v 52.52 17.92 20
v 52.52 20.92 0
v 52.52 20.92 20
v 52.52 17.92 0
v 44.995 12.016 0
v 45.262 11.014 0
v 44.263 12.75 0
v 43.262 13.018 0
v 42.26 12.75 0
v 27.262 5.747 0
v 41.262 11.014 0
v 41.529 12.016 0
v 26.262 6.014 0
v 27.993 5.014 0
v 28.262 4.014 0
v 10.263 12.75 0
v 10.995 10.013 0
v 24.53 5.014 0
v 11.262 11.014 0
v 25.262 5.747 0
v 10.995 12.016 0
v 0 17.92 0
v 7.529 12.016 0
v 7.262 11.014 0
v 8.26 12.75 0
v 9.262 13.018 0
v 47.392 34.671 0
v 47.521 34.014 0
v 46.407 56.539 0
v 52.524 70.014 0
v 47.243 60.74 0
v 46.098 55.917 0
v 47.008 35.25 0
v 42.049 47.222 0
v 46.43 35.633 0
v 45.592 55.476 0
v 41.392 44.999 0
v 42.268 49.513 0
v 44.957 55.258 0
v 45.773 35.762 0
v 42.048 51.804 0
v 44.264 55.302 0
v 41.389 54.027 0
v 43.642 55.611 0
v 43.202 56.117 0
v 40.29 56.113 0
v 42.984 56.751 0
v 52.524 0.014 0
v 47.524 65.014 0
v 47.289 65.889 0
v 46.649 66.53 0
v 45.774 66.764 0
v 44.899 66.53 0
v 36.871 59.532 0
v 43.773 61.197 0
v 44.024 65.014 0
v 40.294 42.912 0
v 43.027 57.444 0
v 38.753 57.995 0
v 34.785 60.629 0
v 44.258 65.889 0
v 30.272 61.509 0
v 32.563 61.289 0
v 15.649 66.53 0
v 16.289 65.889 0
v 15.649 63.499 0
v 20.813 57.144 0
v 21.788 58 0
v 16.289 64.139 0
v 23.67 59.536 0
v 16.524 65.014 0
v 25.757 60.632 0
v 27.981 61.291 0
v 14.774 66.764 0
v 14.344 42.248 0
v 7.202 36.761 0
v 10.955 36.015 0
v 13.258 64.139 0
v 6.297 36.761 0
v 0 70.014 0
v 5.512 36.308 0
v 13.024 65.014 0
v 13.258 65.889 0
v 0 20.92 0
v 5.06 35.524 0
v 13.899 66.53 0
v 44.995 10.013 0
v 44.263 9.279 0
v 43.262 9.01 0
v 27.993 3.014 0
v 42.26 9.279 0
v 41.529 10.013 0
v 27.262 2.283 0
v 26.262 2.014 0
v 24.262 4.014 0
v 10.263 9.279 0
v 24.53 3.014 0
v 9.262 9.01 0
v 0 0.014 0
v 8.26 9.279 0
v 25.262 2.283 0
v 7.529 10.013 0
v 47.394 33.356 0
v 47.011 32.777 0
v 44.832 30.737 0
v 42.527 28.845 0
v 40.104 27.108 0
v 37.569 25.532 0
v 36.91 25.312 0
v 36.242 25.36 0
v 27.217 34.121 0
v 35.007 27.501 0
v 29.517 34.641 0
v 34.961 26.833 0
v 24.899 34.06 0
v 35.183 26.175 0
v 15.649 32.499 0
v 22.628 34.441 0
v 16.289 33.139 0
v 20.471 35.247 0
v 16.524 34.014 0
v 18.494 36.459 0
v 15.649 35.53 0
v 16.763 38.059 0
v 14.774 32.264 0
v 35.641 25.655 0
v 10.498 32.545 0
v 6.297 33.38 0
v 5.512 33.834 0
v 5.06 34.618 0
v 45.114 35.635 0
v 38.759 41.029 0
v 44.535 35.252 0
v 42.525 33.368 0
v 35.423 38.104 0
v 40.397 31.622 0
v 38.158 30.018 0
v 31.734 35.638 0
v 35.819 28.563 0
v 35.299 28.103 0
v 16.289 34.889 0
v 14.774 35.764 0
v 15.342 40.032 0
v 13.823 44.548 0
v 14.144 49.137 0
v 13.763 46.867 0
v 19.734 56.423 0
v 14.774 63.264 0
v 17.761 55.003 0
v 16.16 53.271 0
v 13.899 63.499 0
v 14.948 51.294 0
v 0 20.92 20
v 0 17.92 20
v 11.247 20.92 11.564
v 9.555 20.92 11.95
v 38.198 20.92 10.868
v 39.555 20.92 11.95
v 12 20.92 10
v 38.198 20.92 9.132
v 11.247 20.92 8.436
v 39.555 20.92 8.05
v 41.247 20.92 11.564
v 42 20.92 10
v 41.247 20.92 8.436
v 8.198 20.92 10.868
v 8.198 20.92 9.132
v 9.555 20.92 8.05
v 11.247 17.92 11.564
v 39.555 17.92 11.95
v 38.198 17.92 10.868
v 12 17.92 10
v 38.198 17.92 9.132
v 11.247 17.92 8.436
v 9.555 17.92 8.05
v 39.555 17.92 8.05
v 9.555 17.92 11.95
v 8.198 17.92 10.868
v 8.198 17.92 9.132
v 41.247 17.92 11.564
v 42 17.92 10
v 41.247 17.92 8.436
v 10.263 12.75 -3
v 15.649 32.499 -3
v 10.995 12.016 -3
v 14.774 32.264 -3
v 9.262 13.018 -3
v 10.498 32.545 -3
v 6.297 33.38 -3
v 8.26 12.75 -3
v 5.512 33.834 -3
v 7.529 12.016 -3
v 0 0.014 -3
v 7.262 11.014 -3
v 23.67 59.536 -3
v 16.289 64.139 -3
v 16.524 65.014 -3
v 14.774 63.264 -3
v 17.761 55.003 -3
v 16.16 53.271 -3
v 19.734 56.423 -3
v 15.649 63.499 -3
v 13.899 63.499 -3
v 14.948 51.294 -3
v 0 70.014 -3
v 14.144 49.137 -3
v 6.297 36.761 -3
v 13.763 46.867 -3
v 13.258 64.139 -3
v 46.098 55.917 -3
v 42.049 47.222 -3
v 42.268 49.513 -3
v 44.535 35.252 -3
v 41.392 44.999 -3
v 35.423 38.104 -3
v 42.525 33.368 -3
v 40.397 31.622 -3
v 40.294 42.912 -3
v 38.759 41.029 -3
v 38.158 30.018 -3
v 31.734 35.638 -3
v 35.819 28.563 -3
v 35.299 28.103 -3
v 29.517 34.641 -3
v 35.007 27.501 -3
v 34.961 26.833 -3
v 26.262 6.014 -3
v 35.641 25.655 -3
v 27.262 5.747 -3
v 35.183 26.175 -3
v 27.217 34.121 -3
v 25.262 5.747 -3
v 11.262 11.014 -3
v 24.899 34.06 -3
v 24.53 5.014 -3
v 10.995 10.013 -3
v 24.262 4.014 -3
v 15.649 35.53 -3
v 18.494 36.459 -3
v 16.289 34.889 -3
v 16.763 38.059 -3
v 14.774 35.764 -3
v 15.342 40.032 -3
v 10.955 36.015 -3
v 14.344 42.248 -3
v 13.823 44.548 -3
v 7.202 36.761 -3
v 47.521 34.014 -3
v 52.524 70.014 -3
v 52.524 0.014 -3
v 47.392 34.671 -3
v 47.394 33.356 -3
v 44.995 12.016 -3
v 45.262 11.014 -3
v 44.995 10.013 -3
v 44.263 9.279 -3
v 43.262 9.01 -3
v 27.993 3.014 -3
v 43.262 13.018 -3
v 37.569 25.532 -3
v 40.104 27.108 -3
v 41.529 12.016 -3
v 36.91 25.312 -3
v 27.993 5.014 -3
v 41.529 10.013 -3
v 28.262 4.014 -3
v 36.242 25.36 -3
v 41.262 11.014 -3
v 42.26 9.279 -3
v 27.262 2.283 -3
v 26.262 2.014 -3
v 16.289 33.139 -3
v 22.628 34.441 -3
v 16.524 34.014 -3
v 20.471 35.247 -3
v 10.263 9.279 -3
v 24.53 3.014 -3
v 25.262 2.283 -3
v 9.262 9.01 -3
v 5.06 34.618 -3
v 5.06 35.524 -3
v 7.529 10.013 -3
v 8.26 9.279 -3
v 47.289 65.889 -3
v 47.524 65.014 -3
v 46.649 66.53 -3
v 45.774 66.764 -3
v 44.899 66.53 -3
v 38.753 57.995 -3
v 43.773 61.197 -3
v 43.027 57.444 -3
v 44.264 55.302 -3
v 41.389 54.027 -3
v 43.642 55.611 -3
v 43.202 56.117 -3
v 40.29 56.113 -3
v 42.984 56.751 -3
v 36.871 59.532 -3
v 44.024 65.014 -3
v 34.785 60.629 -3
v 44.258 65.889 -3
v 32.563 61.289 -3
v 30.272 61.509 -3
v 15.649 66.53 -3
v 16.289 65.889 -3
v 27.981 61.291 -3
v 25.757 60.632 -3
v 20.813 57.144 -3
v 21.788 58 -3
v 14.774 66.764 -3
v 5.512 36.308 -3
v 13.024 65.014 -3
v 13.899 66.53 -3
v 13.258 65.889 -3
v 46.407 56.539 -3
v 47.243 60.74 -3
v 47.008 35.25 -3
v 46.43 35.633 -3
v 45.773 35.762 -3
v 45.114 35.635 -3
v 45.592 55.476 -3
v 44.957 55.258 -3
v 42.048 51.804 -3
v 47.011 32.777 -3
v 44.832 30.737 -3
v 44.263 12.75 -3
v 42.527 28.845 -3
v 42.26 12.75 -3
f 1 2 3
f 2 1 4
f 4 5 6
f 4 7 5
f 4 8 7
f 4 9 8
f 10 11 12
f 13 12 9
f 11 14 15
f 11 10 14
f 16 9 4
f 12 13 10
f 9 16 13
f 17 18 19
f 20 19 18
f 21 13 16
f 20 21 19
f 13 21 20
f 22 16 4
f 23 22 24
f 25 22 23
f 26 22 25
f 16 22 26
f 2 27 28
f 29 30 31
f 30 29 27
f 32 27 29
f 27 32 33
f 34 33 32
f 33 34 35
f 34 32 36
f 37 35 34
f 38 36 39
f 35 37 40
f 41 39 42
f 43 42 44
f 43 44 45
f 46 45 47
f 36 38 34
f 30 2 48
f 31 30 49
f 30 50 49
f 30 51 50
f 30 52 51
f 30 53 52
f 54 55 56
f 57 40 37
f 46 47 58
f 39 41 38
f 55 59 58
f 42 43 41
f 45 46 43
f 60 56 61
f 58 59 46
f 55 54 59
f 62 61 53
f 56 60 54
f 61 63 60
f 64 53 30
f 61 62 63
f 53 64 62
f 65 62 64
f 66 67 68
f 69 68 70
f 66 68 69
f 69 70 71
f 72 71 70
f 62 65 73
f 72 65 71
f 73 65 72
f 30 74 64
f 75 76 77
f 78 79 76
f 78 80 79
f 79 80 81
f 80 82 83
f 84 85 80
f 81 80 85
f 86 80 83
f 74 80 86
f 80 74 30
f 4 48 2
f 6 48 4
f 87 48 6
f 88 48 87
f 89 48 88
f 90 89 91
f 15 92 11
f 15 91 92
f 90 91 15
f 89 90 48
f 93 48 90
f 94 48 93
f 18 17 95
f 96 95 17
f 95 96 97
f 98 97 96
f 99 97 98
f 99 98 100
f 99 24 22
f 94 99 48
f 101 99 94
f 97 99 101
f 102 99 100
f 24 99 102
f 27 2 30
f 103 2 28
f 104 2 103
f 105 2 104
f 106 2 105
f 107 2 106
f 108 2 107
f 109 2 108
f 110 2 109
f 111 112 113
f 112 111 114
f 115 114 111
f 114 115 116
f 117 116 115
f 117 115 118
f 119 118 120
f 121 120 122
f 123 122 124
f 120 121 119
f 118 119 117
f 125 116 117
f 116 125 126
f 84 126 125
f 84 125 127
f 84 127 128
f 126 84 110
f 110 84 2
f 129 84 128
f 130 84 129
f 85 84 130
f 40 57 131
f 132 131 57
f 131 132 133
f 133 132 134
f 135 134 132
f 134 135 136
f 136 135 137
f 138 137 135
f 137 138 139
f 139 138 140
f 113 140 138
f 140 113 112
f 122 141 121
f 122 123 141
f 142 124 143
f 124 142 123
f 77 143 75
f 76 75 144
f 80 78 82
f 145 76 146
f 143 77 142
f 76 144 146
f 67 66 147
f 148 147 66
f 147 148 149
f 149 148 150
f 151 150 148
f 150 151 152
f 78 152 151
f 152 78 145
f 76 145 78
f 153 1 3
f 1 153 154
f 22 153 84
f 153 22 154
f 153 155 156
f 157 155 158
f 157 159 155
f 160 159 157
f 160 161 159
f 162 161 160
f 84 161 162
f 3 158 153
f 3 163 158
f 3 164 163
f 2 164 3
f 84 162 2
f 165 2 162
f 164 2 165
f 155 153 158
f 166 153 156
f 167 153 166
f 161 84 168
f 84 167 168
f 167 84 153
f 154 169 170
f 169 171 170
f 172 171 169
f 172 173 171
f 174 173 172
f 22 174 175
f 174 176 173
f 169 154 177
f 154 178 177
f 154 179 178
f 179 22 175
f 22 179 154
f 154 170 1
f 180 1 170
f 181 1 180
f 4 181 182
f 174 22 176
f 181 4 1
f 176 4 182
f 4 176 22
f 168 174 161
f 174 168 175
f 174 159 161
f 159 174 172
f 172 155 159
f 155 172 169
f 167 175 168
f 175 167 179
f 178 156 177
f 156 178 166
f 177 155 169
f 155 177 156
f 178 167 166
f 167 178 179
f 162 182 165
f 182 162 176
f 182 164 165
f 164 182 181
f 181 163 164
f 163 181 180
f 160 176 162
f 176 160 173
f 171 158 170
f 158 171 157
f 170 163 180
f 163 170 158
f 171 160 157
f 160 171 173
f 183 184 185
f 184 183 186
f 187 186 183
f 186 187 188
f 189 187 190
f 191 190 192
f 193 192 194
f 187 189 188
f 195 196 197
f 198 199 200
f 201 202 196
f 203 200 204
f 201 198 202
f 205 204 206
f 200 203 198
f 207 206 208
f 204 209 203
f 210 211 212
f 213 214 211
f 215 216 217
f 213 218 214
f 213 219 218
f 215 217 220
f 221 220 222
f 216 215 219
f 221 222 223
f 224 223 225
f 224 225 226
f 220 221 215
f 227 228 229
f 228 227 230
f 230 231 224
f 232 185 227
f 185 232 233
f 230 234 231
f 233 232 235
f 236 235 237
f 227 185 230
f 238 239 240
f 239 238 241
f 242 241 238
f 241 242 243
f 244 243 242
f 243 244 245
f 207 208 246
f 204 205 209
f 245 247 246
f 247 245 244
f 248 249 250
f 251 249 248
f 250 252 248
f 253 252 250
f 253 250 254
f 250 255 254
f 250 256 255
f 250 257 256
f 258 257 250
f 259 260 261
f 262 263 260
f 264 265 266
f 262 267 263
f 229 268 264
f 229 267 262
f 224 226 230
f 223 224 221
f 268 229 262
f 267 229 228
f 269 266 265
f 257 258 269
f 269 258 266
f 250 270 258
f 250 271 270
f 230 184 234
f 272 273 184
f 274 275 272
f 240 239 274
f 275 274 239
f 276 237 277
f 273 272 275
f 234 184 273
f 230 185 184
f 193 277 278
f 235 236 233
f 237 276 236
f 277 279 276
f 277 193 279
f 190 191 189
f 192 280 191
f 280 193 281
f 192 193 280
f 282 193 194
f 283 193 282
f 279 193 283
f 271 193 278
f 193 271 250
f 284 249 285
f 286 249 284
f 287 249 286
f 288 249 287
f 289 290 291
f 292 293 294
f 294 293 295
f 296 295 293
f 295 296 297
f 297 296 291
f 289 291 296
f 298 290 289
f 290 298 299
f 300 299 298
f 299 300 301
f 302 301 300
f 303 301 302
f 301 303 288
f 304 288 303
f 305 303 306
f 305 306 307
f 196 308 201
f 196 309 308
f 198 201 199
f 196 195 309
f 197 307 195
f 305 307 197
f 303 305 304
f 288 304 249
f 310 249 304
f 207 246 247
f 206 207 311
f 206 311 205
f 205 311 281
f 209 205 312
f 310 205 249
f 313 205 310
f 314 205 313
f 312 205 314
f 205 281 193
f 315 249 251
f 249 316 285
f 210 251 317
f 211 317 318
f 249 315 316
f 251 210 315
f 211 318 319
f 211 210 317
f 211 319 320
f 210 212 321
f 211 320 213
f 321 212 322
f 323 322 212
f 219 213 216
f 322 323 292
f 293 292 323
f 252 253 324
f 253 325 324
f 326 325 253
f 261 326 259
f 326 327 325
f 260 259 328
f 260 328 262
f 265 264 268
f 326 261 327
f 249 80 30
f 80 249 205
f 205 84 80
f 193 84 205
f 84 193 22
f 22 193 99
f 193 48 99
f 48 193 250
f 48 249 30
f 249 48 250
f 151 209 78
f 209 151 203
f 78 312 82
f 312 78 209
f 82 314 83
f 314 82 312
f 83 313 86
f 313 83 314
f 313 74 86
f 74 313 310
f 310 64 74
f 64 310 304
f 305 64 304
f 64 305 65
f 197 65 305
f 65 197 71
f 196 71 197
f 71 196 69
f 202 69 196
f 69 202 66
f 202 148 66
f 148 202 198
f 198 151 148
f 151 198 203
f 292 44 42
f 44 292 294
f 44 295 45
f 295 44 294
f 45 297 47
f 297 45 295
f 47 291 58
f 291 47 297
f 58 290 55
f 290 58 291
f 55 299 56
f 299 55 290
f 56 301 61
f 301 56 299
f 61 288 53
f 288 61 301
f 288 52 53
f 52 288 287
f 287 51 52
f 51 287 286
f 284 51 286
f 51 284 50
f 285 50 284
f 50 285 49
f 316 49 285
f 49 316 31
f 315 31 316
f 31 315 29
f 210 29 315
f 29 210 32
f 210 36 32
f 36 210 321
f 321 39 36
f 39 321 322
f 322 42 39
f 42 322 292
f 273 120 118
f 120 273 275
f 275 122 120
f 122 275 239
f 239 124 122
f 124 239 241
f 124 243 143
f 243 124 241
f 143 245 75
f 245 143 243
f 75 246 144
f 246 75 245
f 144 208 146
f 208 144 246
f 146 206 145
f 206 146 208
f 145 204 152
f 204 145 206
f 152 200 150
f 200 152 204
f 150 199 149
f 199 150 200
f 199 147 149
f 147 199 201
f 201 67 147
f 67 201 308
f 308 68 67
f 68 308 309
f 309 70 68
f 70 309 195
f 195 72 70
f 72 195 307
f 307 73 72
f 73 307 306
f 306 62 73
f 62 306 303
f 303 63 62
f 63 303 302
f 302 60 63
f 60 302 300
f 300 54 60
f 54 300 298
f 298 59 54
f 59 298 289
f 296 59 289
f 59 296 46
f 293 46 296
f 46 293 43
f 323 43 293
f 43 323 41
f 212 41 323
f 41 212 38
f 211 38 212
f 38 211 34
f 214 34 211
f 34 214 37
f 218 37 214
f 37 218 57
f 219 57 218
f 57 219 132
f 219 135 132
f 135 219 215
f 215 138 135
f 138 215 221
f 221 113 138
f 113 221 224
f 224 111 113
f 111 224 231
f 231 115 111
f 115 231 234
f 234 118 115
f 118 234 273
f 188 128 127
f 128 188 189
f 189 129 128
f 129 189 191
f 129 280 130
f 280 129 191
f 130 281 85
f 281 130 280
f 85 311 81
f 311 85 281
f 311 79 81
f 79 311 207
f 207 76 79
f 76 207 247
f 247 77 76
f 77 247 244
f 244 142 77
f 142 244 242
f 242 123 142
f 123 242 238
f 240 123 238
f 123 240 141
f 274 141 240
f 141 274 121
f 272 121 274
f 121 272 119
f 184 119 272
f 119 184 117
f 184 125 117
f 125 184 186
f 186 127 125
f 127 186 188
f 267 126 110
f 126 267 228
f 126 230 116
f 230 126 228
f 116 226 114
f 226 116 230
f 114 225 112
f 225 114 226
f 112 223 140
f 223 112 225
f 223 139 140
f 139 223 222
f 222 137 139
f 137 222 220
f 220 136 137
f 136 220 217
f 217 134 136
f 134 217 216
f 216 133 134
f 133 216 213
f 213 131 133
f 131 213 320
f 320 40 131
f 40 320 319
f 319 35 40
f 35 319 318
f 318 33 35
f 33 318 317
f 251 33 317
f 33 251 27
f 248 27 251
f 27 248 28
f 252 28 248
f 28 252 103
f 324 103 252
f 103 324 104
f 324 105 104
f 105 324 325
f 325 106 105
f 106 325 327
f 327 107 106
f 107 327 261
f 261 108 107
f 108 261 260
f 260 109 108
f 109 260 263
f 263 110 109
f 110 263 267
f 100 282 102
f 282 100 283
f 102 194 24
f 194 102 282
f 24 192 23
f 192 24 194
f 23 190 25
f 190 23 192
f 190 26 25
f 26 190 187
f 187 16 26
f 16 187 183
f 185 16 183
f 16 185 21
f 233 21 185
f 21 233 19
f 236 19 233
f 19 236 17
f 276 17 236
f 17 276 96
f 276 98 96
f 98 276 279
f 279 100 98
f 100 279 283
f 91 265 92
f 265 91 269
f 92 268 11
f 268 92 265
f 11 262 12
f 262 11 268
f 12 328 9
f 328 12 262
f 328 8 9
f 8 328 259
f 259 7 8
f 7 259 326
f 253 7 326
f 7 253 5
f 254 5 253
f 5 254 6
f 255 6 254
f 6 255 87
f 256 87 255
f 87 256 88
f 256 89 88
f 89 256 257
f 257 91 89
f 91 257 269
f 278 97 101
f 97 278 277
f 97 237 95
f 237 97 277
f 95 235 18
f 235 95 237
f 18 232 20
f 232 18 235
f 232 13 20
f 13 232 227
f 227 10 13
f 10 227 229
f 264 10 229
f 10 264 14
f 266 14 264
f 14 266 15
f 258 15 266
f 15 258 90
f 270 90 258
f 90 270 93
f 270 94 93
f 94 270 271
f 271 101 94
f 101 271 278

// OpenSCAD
//lh: mirror([0,0,0])
//rh: mirror([1,0,0])  

mirror([1,0,0])rotate([0,180,0]) {
    translate([-294.24,17.4+70,0]){
        linear_extrude(3)import("stepperMount_lh_IS.dxf",layer="bracket");
    }
    difference() {
        translate([0,17.92,-20])cube([52.52,3,20]);
        translate([10,17.92+5,-10])rotate([90,0,0])cylinder(h=5,d=4);
        translate([50-10,17.92+5,-10])rotate([90,0,0])cylinder(h=5,d=4);
    }
}
